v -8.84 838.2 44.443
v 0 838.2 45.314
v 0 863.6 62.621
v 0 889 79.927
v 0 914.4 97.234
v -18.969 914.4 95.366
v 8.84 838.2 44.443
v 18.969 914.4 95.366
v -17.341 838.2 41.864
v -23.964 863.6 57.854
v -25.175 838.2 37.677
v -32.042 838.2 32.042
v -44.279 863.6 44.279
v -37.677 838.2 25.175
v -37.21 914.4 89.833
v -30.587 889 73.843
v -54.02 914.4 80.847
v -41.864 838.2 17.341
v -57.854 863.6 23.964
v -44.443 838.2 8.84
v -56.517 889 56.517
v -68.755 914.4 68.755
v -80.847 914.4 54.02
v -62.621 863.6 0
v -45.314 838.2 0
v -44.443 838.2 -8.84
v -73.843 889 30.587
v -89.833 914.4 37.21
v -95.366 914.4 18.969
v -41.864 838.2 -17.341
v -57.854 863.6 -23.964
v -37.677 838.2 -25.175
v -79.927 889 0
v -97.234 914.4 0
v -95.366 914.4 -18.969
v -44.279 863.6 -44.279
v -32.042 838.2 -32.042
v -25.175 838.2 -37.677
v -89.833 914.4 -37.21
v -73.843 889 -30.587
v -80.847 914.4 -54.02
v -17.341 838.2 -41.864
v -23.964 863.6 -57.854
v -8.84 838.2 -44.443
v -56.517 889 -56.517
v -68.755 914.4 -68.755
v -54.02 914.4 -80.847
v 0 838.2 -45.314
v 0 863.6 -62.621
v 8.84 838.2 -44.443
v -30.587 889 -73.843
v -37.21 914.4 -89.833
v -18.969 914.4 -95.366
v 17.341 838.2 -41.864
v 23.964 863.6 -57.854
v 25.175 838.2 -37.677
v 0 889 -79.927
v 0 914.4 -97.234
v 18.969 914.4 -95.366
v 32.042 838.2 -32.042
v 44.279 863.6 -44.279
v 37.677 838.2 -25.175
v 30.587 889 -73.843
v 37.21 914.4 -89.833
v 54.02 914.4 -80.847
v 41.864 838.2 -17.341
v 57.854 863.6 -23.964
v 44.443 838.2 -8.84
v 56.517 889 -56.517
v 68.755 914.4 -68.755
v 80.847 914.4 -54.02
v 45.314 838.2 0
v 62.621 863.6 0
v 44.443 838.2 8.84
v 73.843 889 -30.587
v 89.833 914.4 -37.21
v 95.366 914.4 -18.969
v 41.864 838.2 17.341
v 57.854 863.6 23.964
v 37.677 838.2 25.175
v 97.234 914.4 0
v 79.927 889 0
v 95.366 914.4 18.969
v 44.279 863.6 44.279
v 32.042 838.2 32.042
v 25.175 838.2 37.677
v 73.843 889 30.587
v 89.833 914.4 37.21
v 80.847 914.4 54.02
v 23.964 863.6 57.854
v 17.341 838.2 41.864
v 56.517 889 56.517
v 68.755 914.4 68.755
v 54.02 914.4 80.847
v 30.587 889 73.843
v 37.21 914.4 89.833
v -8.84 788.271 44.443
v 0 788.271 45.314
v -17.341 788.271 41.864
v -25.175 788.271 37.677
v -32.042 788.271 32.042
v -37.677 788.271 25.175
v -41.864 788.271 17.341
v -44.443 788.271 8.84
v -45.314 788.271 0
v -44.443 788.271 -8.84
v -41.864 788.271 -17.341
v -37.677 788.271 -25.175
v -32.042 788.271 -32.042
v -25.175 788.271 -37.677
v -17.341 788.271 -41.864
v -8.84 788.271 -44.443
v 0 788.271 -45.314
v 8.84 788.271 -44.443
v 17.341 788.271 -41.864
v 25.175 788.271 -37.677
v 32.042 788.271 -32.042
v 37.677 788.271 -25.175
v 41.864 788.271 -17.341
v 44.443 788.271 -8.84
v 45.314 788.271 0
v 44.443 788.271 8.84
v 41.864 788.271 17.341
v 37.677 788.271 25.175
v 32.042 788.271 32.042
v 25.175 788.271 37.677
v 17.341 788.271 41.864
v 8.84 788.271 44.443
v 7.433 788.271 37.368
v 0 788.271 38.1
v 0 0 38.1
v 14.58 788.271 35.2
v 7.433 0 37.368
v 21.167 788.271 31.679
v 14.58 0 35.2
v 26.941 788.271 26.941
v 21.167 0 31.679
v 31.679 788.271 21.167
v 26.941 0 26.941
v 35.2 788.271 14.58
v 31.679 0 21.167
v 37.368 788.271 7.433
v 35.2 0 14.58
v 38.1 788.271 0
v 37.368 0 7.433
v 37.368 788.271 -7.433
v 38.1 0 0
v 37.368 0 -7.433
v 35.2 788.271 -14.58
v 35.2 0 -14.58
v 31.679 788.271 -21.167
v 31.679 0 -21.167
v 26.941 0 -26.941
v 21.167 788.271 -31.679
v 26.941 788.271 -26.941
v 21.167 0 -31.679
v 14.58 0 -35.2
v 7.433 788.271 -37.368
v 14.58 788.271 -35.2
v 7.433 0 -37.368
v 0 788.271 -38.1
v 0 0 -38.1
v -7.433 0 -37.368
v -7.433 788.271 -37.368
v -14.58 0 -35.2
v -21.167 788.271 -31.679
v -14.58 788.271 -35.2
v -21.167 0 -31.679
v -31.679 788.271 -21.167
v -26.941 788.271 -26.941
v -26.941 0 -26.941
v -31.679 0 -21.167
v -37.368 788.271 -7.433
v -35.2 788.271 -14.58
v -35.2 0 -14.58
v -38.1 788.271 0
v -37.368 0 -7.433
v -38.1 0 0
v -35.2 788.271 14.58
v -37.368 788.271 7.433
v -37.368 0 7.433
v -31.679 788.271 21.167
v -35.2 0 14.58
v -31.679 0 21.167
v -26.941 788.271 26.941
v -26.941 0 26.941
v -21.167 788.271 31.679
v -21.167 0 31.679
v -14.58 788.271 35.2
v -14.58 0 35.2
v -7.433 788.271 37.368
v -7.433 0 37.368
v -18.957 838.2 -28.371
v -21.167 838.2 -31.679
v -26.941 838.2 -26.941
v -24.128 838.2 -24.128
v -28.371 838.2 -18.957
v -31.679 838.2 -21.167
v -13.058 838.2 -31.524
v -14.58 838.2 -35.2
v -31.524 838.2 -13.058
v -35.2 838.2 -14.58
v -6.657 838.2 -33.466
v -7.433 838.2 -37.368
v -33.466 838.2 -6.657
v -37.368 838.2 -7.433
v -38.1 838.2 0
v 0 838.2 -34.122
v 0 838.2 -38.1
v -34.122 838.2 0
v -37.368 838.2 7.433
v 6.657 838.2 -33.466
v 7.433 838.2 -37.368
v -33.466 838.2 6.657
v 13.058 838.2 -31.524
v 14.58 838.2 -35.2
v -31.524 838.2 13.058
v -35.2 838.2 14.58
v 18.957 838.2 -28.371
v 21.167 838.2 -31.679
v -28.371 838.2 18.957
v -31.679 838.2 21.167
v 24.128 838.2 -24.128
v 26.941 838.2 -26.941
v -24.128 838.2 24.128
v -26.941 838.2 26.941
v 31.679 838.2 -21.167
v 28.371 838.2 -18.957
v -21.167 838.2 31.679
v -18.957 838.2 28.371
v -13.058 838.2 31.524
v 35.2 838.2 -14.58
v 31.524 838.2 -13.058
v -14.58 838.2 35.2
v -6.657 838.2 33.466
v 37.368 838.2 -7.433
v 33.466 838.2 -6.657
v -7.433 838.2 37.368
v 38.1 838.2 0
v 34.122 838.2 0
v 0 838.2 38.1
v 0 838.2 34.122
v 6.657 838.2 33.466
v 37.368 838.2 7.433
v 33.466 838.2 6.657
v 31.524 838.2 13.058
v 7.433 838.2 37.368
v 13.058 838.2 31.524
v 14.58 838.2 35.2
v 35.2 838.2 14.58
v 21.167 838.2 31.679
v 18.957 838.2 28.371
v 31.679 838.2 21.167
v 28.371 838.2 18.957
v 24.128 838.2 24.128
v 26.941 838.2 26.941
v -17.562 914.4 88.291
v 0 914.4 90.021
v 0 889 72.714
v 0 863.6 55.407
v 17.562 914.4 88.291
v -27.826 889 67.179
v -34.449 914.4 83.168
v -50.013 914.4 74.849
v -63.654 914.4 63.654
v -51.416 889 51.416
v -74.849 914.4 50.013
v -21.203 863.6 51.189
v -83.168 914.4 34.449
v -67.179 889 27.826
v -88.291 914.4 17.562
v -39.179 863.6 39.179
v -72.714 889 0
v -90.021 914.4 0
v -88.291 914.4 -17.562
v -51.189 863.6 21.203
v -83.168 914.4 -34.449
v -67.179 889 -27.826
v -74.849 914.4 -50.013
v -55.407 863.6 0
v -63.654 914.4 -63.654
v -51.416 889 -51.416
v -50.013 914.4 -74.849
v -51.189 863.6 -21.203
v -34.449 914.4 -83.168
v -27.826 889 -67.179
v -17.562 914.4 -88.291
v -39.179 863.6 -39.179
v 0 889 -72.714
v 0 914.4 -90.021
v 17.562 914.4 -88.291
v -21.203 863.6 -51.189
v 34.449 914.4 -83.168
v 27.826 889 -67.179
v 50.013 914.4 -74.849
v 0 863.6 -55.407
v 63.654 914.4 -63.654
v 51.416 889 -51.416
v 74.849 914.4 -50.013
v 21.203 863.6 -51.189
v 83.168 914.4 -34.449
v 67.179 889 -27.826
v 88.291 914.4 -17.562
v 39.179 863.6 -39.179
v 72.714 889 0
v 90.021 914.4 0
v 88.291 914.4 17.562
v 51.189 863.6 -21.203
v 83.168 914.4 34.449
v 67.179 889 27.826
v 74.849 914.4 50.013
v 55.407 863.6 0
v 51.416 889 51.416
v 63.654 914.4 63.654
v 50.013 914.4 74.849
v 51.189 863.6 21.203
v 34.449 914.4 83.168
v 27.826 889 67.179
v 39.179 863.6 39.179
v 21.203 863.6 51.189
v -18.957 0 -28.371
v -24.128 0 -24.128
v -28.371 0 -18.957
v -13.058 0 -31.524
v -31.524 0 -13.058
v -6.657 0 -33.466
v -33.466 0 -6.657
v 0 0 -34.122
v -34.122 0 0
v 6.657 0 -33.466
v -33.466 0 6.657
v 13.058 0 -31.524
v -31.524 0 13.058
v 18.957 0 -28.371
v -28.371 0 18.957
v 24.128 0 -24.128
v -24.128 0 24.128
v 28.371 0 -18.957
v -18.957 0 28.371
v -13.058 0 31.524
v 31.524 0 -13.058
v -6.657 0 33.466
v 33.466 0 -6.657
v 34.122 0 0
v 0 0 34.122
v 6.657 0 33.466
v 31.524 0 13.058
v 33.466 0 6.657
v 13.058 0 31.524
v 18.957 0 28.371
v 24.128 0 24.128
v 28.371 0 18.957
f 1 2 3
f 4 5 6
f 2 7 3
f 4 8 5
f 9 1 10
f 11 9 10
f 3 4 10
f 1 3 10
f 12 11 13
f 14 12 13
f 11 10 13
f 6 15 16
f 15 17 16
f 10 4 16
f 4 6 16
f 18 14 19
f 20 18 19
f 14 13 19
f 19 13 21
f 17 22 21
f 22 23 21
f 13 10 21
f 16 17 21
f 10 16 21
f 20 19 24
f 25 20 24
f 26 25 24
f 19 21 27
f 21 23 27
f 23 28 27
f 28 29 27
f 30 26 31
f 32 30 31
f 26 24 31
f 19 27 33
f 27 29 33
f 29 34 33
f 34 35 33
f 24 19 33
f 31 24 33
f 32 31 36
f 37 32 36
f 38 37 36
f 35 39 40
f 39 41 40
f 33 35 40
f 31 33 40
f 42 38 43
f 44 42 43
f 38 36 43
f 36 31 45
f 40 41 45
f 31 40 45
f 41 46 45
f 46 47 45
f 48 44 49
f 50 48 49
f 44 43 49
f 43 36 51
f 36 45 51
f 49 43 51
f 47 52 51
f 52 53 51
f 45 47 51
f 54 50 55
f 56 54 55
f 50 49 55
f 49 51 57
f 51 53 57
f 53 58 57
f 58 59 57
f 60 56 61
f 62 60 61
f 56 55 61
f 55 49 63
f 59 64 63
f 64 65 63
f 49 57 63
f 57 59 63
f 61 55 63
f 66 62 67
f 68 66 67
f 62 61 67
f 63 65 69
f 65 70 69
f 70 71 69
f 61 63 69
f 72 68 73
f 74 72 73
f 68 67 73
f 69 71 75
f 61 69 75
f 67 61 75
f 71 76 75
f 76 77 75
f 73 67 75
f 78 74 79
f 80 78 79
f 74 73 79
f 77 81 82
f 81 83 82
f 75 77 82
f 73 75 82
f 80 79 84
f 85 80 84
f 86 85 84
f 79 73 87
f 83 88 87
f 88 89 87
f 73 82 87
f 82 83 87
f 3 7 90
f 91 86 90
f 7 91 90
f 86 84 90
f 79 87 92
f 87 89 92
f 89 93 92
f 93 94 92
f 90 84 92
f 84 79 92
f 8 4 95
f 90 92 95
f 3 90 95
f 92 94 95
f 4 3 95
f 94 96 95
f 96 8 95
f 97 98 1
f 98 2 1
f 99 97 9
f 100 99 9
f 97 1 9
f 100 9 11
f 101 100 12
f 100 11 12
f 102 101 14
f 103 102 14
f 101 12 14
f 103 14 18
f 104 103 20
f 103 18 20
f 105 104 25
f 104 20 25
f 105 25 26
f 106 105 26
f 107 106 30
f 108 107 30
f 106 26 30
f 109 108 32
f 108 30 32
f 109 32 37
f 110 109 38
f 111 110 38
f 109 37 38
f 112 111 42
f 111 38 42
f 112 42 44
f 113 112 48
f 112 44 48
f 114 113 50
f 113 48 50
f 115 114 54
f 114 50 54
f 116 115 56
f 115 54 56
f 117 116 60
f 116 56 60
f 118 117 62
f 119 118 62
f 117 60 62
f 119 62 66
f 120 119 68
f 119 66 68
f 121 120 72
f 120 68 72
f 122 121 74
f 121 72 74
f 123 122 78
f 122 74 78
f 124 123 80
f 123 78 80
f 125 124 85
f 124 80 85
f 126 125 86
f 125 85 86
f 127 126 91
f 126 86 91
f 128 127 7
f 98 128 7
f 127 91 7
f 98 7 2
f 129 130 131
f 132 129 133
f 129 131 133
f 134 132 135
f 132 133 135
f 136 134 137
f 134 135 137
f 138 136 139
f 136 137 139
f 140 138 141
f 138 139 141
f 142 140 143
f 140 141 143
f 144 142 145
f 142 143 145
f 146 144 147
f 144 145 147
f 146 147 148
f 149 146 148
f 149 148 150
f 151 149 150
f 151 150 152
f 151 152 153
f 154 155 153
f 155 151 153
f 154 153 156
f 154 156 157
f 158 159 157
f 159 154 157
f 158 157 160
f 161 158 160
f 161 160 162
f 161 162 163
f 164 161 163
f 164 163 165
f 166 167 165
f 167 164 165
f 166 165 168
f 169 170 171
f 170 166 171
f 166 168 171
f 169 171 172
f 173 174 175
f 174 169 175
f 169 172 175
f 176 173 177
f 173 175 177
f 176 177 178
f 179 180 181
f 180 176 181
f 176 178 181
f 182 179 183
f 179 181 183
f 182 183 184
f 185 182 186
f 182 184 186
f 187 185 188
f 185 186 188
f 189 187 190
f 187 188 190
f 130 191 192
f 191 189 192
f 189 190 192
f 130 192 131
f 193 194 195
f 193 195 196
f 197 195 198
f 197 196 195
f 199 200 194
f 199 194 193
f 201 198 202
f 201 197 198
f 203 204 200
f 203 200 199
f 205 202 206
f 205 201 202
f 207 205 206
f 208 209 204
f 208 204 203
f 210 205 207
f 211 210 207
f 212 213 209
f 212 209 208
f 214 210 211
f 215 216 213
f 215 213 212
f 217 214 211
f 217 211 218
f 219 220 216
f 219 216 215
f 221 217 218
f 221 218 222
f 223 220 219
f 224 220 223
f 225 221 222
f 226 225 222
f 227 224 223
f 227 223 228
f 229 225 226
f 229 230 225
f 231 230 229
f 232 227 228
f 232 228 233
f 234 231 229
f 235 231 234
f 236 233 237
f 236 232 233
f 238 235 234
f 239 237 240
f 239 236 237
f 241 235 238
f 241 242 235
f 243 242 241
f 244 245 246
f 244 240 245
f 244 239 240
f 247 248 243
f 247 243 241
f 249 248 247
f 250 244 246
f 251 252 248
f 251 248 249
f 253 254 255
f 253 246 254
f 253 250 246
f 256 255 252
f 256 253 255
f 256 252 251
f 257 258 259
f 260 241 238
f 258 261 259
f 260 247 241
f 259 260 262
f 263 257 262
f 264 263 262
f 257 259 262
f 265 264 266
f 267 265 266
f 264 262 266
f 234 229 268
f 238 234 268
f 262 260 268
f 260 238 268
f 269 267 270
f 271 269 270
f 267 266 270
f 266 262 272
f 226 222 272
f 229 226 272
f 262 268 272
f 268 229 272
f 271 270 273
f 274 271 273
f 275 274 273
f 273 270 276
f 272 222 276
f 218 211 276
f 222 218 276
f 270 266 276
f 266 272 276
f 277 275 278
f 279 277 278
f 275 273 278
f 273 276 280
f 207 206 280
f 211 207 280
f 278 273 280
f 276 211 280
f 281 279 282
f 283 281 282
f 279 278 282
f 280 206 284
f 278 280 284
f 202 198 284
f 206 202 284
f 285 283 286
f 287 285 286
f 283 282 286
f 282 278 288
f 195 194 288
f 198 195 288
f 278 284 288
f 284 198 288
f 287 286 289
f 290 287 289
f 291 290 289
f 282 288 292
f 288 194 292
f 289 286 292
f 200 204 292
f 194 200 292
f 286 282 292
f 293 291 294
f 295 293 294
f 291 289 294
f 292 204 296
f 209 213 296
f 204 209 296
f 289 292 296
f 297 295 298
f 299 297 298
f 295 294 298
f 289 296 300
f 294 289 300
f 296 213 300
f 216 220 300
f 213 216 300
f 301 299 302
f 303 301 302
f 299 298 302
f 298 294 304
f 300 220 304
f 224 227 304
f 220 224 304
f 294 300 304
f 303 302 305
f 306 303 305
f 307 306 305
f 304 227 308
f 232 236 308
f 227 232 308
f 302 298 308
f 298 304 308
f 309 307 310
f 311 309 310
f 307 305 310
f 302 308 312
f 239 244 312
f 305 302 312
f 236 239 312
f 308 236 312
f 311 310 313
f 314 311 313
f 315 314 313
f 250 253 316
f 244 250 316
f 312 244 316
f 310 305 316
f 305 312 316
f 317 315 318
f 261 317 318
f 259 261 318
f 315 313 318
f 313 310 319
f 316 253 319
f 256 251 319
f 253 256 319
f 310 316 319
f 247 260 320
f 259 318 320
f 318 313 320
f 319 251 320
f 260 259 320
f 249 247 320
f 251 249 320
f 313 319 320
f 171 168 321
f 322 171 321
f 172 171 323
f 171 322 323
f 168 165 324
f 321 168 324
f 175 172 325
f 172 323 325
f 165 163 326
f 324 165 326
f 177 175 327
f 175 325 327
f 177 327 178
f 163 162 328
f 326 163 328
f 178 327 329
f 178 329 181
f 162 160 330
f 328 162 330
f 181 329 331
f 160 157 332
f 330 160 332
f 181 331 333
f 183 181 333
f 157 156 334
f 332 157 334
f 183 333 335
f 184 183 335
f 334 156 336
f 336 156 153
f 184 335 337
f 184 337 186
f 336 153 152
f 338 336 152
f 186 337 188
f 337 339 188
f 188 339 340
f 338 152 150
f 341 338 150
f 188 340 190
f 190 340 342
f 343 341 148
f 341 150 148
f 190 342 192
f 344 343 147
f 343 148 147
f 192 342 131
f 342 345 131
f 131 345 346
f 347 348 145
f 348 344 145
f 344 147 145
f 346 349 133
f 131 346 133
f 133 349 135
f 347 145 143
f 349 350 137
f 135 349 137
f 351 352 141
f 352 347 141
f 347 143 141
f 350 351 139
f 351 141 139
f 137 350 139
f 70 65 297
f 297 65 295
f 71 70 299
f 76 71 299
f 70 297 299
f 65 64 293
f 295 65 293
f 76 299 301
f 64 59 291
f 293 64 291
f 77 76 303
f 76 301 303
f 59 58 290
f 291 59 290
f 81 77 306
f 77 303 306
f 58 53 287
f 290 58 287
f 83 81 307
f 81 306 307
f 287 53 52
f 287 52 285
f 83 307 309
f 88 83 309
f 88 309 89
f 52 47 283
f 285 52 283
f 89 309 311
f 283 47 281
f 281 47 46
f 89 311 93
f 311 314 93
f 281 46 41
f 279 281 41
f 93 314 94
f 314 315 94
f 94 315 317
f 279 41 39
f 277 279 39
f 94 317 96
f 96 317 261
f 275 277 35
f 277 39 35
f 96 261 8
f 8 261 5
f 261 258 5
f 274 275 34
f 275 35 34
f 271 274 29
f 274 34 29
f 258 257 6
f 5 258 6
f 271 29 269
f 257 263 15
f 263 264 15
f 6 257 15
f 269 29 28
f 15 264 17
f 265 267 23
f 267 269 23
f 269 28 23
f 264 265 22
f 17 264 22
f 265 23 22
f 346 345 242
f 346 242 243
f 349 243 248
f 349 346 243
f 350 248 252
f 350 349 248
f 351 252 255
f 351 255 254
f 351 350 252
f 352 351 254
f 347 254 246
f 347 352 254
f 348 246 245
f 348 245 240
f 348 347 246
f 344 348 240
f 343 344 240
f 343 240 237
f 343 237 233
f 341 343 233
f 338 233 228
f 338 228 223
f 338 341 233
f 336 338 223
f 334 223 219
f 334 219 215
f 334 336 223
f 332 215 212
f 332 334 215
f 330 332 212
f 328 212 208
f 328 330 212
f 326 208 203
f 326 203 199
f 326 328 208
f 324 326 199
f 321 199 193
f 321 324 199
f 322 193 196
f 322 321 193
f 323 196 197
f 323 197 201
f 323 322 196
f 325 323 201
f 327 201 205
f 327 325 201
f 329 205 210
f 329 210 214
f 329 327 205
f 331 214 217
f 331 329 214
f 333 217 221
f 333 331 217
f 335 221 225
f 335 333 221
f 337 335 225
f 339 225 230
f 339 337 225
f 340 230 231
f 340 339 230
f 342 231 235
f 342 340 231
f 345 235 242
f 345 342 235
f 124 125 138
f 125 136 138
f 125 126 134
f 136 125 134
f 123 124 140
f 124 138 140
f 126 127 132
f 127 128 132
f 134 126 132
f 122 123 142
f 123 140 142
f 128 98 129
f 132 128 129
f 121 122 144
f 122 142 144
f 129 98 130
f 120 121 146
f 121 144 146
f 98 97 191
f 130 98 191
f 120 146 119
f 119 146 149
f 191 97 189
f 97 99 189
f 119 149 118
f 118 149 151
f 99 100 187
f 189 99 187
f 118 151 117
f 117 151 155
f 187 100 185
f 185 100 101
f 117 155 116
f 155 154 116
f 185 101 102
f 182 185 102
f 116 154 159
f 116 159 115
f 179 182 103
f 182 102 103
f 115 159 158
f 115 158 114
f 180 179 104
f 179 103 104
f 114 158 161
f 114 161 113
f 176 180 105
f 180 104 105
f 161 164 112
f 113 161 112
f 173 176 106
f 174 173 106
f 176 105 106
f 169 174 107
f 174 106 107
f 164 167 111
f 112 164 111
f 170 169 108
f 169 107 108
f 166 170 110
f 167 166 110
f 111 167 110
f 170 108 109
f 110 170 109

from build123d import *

# Parameters (mm, degrees)
SKETCH1_R           = 38.1
SKETCH1_R_2         = 34.121686747
BOSS_EXTRUDE1_DEPTH = 838.2


with BuildPart() as part:
    # Sketch1 → Boss-Extrude1 (new body)
    with BuildSketch(Plane(origin=(0, 0, 0), x_dir=(1, 0, 0), z_dir=(0, 1, 0))):
        with Locations(Location((0, 0, 0), (0, 0, 270))):
            Circle(SKETCH1_R)
        with Locations(Location((0, 0, 0), (0, 0, 270))):
            Circle(SKETCH1_R_2, mode=Mode.SUBTRACT)
    extrude(amount=BOSS_EXTRUDE1_DEPTH)

    # Sketch2 → Revolve1 (revolve)
    with BuildSketch(Plane(origin=(0, 0, 0), x_dir=(0, 0, -1), z_dir=(1, 0, 0))):
        Polygon((-38.1, 788.271478615), (-45.313643111, 788.271478615), (-45.313643111, 838.2), (-97.234227, 914.4), (-90.020583889, 914.4), (-38.1, 838.2), align=None)
    revolve(axis=Axis((0, 838.2, 0), (0, -1, 0)))


solid = part.part
